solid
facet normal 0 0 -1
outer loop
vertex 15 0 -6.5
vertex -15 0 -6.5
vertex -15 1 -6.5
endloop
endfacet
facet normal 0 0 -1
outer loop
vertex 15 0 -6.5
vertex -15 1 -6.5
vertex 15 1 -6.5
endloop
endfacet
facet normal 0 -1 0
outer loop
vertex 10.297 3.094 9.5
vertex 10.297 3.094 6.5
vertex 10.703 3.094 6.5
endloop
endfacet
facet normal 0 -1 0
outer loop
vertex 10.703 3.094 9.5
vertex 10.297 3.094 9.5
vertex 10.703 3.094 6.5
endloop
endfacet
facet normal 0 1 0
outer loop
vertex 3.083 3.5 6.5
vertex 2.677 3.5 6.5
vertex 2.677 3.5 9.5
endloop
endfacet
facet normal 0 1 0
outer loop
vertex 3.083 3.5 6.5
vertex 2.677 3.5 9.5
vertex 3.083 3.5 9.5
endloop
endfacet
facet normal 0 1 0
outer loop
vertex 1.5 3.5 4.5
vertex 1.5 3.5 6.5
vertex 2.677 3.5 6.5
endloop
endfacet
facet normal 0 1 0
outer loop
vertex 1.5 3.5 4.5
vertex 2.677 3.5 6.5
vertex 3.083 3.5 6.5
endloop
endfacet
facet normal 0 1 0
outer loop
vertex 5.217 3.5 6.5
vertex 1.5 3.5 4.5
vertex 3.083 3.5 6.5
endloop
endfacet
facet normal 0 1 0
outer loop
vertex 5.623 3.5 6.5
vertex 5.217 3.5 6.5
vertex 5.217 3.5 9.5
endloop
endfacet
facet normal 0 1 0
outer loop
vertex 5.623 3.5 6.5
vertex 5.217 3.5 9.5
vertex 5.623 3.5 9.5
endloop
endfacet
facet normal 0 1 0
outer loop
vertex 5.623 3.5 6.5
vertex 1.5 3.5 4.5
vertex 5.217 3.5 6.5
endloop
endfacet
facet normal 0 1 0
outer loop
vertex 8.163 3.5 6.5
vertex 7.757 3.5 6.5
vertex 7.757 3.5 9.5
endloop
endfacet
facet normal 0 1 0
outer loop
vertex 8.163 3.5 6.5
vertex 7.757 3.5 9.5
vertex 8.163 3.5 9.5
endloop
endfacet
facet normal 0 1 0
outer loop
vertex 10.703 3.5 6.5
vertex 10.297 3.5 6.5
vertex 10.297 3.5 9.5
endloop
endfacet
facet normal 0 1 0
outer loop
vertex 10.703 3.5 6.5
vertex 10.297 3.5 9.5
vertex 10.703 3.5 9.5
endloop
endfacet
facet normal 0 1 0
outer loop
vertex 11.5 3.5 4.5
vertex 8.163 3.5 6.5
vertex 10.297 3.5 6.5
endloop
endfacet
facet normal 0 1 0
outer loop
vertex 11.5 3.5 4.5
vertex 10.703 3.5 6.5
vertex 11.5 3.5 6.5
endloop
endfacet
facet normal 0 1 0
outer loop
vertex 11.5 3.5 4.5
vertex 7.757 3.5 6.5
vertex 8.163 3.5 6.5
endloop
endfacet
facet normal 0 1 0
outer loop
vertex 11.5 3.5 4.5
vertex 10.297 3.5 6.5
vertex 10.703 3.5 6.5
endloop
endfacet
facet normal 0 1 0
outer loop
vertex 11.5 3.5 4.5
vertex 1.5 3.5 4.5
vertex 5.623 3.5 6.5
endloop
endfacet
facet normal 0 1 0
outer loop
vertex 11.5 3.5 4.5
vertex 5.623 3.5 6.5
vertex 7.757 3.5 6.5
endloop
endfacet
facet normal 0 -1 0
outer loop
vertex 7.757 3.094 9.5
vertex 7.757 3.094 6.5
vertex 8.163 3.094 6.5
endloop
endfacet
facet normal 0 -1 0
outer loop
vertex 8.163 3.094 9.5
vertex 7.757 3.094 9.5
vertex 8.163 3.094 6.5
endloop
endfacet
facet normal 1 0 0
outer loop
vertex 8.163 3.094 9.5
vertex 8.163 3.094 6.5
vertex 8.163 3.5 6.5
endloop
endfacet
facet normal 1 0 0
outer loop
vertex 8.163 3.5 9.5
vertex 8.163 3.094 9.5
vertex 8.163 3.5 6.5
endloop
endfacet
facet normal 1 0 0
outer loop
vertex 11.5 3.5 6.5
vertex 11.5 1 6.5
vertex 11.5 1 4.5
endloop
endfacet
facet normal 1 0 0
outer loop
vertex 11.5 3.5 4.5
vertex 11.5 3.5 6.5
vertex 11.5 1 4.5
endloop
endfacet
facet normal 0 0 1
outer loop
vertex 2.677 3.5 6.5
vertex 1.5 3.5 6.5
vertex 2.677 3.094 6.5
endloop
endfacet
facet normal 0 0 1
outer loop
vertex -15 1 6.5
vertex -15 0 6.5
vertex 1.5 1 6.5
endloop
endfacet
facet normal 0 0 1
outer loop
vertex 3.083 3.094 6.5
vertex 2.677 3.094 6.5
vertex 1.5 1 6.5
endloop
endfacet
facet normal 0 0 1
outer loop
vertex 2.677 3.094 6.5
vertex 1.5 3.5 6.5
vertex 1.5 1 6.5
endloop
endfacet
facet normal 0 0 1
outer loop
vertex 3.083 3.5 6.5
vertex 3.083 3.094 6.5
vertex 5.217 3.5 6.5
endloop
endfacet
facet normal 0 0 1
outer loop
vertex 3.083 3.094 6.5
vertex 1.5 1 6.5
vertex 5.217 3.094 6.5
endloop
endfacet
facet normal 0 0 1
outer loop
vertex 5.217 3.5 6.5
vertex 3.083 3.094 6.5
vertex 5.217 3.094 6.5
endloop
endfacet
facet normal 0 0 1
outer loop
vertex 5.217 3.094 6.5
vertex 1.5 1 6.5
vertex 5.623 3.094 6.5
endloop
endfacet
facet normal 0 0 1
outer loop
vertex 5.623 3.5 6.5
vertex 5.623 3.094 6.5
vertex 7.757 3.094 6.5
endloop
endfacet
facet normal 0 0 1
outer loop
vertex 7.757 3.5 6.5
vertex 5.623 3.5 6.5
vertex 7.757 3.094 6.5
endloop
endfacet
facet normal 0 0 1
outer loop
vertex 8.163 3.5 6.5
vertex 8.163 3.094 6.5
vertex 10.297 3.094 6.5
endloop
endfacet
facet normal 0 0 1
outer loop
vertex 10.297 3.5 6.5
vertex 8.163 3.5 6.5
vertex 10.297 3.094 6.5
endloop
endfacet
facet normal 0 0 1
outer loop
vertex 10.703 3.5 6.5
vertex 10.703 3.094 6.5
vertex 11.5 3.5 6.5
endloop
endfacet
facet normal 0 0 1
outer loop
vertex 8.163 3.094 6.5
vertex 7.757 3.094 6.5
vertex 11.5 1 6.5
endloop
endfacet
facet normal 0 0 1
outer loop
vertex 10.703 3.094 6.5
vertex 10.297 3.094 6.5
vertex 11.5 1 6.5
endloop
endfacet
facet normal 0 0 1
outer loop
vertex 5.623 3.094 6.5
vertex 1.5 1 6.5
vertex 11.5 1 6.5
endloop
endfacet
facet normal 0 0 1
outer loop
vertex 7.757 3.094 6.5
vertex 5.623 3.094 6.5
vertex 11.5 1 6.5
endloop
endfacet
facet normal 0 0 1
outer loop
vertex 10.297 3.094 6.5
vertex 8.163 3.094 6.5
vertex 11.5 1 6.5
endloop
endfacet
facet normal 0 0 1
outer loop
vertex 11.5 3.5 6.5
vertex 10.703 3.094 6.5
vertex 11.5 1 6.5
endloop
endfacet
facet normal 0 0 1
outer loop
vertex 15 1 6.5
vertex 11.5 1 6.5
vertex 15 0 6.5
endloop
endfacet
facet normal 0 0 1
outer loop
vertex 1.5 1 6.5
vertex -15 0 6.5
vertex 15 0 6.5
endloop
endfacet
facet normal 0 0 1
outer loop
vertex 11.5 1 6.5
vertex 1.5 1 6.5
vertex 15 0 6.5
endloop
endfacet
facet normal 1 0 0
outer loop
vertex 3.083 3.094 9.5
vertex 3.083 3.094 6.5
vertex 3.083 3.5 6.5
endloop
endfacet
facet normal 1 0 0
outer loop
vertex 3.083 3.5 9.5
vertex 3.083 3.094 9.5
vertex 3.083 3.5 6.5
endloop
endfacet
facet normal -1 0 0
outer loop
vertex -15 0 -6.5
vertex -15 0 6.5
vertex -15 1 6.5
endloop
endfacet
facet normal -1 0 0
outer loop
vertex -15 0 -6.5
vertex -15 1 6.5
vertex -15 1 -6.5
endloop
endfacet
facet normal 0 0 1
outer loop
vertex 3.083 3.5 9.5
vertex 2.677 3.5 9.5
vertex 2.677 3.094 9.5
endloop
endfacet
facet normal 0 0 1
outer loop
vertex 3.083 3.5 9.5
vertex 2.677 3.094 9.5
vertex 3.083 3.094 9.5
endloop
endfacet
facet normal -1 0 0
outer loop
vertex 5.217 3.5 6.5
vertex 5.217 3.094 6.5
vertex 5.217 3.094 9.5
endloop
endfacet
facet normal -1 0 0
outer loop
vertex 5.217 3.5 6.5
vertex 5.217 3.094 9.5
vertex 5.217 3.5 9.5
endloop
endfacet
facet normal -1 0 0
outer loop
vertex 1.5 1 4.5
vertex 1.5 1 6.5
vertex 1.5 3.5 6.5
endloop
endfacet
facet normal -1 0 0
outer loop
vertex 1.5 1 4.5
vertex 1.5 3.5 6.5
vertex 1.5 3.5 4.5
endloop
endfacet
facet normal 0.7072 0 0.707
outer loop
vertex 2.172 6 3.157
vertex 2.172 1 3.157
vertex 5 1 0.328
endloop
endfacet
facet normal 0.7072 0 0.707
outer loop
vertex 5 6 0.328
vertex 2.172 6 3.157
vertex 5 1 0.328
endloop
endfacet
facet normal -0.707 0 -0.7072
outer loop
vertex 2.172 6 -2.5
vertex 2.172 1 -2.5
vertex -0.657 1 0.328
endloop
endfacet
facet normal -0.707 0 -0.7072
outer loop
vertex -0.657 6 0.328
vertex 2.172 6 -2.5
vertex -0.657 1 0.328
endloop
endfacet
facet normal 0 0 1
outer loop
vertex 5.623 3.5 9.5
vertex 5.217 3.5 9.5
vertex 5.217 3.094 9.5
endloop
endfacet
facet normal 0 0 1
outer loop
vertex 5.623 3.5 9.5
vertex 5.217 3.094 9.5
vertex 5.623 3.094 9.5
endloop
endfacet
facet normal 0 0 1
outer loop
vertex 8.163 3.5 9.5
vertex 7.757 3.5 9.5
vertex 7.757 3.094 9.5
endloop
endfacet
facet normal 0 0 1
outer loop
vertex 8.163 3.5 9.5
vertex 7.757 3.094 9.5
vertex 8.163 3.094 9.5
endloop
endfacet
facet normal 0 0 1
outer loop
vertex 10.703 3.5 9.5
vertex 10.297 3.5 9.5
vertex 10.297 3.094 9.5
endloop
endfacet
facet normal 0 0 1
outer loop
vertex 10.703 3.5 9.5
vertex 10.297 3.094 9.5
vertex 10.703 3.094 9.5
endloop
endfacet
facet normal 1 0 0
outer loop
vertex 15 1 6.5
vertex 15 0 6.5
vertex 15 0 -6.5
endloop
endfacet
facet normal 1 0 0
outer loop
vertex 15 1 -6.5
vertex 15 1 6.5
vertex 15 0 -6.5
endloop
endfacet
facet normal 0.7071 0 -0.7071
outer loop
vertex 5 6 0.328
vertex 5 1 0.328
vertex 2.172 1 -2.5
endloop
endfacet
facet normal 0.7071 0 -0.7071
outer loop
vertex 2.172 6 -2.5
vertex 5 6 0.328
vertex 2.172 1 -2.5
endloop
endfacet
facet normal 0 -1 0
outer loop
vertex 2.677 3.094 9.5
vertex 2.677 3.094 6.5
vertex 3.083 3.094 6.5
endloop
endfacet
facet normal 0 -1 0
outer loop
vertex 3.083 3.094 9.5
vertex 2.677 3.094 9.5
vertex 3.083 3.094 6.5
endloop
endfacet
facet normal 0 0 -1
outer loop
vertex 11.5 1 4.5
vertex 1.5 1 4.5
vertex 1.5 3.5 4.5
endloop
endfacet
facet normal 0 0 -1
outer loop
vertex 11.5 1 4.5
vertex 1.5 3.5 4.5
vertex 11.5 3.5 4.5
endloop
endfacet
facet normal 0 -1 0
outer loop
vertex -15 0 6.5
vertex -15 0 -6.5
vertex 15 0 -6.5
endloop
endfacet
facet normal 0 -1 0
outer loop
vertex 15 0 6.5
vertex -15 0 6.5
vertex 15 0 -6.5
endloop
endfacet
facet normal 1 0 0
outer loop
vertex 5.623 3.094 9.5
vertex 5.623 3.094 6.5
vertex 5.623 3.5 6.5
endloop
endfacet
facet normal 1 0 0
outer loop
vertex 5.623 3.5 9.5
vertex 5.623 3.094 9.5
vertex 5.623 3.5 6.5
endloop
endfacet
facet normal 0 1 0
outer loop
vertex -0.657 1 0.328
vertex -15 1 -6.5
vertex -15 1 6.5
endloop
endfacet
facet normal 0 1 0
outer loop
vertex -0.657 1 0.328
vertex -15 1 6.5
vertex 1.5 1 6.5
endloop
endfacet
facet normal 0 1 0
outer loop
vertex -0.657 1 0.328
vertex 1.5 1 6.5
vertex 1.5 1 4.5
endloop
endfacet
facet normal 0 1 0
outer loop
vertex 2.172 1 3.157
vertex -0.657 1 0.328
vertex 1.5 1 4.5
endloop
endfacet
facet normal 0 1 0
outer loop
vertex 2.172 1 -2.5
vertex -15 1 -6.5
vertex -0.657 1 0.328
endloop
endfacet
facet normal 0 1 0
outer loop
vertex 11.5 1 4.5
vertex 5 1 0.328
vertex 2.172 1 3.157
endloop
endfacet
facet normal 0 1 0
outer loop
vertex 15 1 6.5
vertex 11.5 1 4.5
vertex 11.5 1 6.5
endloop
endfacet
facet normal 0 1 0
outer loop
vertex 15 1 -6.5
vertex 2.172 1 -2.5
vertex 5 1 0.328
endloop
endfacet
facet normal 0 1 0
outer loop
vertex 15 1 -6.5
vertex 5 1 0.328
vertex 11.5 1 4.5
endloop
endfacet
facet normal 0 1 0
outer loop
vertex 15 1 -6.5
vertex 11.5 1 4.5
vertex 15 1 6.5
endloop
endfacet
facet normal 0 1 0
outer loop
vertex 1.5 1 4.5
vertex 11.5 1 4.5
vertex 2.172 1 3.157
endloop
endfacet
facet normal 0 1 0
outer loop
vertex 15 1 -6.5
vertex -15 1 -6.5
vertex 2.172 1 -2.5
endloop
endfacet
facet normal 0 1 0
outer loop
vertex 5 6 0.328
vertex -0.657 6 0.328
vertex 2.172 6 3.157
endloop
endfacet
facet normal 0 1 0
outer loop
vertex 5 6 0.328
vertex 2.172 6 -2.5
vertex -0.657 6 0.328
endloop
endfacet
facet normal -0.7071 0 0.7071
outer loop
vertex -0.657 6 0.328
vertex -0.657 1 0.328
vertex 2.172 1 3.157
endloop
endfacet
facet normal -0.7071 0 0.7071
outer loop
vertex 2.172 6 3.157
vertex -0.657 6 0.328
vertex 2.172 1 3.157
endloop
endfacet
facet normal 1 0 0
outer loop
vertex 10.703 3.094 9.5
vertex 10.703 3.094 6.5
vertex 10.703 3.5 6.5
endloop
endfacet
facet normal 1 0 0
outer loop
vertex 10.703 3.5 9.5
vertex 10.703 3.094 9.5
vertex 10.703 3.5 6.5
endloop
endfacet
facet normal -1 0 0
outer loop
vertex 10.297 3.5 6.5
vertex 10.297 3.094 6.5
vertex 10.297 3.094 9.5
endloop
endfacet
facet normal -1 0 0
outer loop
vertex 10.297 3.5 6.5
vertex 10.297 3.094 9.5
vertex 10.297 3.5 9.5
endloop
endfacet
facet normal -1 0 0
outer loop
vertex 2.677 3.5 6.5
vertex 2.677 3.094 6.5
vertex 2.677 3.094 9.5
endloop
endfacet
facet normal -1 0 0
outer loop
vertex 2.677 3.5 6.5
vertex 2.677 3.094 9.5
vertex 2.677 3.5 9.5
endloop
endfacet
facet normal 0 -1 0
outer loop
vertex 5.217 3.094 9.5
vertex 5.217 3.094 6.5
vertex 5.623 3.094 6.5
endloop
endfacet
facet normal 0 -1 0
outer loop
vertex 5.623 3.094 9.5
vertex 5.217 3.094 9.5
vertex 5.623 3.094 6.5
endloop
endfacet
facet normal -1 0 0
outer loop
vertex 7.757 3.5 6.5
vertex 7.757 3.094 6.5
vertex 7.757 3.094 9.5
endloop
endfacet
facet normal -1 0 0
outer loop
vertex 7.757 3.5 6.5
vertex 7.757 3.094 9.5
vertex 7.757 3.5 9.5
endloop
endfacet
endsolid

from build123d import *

# Parameters (mm, degrees)
SKETCH1_W           = 30
SKETCH1_H           = 13
BOSS_EXTRUDE1_DEPTH = 1
SKETCH2_W           = 10
SKETCH2_H           = 2
BOSS_EXTRUDE2_DEPTH = 2.5
SKETCH4_W           = 0.4064
SKETCH4_H           = 0.4064
BOSS_EXTRUDE3_DEPTH = 3
LPATTERN1_COUNT     = 4
LPATTERN1_PITCH     = 2.54
BOSS_EXTRUDE4_DEPTH = 5


with BuildPart() as part:
    # Sketch1 → Boss-Extrude1 (new body)
    with BuildSketch(Plane(origin=(0, 0, 0), x_dir=(1, 0, 0), z_dir=(0, 1, 0))):
        Rectangle(SKETCH1_W, SKETCH1_H)
    extrude(amount=BOSS_EXTRUDE1_DEPTH)

    # Sketch2 → Boss-Extrude2 (add)
    with BuildSketch(Plane(origin=(0, 1, 0), x_dir=(1, 0, 0), z_dir=(0, 1, 0))):
        with Locations((6.5, -5.5)):
            Rectangle(SKETCH2_W, SKETCH2_H)
    extrude(amount=BOSS_EXTRUDE2_DEPTH)

    # Sketch4 → Boss-Extrude3 (add)
    with BuildSketch(Plane.XY.offset(6.5)):
        with Locations((10.5, 3.2968)):
            Rectangle(SKETCH4_W, SKETCH4_H)
    boss_extrude3 = extrude(amount=BOSS_EXTRUDE3_DEPTH)

    # LPattern1: Boss-Extrude3 ×4
    with Locations(*[(-i * LPATTERN1_PITCH, 0, 0) for i in range(1, LPATTERN1_COUNT)]):
        add(boss_extrude3)

    # Sketch5 → Boss-Extrude4 (add)
    with BuildSketch(Plane(origin=(0, 1, 0), x_dir=(1, 0, 0), z_dir=(0, 1, 0))):
        Polygon((-0.656854249, -0.328427125), (2.171572875, -3.156854249), (5, -0.328427125), (2.171572875, 2.5), align=None)
    extrude(amount=BOSS_EXTRUDE4_DEPTH)


solid = part.part
